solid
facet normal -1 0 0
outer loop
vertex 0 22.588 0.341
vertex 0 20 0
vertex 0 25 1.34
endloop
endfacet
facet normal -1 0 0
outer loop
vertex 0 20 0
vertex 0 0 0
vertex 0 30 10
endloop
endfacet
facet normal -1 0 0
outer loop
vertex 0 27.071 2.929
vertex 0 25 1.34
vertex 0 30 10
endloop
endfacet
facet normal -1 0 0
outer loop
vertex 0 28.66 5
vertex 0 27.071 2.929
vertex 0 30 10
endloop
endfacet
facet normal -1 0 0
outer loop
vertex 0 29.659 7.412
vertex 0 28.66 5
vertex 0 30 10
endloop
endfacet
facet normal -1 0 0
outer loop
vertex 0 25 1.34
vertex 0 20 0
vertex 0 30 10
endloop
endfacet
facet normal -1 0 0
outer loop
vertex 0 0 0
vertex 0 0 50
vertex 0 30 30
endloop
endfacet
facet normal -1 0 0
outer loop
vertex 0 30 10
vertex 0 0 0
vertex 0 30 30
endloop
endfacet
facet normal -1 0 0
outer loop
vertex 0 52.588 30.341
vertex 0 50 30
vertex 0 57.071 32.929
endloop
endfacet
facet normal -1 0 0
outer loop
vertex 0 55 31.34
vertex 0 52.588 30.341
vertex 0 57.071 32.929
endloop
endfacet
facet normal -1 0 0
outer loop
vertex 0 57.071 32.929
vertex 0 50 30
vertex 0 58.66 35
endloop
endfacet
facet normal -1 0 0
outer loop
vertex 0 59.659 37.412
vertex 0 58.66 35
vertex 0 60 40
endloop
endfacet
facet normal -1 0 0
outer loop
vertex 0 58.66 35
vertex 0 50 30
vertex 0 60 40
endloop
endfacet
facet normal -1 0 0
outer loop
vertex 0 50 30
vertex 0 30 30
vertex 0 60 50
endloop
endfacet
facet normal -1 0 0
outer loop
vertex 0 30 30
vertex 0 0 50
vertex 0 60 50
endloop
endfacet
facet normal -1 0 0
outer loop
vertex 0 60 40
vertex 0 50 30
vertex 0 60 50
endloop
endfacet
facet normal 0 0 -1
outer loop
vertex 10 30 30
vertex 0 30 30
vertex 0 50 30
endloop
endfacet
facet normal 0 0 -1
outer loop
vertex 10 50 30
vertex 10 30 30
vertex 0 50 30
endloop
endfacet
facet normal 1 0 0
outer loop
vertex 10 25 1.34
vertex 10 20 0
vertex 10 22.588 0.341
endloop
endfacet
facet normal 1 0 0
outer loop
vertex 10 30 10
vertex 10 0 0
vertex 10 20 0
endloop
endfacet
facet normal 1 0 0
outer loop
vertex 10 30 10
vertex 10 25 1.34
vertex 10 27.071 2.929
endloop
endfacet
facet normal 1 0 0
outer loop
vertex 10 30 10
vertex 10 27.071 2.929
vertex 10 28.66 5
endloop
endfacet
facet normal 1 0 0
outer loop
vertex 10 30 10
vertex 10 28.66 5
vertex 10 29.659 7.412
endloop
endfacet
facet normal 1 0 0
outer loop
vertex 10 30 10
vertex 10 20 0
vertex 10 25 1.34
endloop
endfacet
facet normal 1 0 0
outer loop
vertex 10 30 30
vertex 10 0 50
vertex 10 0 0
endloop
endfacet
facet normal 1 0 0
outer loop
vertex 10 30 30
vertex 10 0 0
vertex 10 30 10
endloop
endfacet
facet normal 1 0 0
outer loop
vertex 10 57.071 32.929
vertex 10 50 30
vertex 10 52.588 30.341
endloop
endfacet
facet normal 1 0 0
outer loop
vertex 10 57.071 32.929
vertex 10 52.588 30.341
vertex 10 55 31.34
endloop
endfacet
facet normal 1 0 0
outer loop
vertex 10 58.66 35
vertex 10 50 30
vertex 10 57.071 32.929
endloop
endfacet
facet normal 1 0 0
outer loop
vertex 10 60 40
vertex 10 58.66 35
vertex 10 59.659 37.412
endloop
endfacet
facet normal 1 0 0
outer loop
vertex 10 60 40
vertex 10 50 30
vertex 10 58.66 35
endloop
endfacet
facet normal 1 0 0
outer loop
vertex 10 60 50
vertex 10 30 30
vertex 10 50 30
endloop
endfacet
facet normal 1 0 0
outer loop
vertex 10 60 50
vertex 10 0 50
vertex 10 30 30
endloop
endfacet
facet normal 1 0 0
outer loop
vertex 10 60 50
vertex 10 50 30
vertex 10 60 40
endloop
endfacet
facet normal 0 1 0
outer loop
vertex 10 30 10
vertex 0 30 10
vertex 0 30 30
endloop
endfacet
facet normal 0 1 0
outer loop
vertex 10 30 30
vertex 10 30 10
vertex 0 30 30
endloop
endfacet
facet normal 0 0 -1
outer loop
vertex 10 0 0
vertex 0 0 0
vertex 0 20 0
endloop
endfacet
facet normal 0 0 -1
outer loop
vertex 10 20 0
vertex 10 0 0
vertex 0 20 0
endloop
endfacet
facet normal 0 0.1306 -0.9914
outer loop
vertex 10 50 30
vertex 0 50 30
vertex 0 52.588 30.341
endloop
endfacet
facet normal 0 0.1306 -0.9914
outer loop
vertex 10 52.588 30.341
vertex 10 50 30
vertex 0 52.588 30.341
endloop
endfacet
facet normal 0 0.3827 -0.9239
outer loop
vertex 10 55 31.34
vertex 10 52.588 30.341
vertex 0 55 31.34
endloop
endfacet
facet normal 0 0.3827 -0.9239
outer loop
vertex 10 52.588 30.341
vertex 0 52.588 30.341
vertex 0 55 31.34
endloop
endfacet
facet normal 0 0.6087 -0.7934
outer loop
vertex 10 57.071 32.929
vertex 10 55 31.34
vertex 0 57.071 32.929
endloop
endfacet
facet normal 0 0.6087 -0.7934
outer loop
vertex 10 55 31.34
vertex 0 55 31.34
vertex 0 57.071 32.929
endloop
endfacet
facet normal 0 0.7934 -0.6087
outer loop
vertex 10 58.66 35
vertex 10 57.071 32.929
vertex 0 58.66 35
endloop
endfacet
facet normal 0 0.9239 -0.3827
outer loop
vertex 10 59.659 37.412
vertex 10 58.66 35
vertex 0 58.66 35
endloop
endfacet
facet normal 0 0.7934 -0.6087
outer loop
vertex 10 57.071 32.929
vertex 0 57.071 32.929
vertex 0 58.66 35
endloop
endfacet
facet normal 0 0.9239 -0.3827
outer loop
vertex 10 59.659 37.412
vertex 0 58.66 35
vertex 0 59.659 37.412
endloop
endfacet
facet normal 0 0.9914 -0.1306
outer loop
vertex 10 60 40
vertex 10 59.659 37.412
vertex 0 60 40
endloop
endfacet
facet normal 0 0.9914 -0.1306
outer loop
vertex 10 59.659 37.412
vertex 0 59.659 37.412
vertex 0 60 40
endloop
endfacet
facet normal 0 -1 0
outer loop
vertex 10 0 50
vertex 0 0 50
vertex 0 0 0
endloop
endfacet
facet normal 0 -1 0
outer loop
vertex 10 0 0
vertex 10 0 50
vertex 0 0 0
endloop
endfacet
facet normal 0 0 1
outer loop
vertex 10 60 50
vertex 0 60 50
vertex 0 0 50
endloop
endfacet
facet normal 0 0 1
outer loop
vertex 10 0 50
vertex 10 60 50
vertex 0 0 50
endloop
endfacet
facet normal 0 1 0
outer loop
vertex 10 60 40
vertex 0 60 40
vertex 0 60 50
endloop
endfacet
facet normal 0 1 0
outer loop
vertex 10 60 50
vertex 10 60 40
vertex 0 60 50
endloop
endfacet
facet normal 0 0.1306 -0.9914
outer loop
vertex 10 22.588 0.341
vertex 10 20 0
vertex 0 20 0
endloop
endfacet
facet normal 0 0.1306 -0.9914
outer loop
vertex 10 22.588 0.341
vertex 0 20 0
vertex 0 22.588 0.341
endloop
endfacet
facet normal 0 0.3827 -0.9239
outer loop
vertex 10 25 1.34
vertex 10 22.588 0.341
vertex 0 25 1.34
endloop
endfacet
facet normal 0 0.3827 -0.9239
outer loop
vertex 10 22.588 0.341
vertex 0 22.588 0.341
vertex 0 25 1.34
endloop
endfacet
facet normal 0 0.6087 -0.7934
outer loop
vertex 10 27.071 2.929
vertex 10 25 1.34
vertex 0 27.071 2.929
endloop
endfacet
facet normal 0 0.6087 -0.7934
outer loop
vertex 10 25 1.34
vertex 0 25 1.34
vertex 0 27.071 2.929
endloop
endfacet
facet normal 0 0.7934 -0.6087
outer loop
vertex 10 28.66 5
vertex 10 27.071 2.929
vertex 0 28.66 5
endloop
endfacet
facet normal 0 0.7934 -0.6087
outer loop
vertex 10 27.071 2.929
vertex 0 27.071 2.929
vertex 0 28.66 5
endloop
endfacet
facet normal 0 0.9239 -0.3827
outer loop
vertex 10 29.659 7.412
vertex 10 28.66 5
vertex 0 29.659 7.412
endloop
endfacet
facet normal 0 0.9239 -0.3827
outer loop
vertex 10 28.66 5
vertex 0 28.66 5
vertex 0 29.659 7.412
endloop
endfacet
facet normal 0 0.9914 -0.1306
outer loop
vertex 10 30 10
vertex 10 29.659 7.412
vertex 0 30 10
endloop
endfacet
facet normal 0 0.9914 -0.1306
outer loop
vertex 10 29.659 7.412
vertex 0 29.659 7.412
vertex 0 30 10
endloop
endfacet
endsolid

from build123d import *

# Parameters (mm, degrees)
F0_W     = 10
F0_H     = 40
F0_H_2   = 10
F0_W_2   = 30
F1_DEPTH = 10


with BuildPart() as f1:
    # F0 (on Right) → F1 (new body)
    with BuildSketch(Plane.YZ):
        with Locations((5, 20)):
            Rectangle(F0_W, F0_H)
        with Locations((55, 45)):
            Rectangle(F0_W, F0_H_2)
        Polygon((0, 50), (0, 40), (10, 40), (20, 40), (20, 50), align=None)
        with Locations((35, 45)):
            Rectangle(F0_W_2, F0_H_2)
        with BuildLine():
            Line((10, 40), (10, 0))
            Line((10, 0), (20, 0))
            ThreePointArc((20, 0), (27.071068, 2.928932), (30, 10))
            Line((30, 10), (30, 30))
            Line((30, 30), (40, 30))
            Line((40, 30), (50, 30))
            ThreePointArc((50, 30), (57.071068, 32.928932), (60, 40))
            Line((60, 40), (50, 40))
            Line((50, 40), (20, 40))
            Line((20, 40), (10, 40))
        make_face()
    extrude(amount=F1_DEPTH)


solid = f1.part
